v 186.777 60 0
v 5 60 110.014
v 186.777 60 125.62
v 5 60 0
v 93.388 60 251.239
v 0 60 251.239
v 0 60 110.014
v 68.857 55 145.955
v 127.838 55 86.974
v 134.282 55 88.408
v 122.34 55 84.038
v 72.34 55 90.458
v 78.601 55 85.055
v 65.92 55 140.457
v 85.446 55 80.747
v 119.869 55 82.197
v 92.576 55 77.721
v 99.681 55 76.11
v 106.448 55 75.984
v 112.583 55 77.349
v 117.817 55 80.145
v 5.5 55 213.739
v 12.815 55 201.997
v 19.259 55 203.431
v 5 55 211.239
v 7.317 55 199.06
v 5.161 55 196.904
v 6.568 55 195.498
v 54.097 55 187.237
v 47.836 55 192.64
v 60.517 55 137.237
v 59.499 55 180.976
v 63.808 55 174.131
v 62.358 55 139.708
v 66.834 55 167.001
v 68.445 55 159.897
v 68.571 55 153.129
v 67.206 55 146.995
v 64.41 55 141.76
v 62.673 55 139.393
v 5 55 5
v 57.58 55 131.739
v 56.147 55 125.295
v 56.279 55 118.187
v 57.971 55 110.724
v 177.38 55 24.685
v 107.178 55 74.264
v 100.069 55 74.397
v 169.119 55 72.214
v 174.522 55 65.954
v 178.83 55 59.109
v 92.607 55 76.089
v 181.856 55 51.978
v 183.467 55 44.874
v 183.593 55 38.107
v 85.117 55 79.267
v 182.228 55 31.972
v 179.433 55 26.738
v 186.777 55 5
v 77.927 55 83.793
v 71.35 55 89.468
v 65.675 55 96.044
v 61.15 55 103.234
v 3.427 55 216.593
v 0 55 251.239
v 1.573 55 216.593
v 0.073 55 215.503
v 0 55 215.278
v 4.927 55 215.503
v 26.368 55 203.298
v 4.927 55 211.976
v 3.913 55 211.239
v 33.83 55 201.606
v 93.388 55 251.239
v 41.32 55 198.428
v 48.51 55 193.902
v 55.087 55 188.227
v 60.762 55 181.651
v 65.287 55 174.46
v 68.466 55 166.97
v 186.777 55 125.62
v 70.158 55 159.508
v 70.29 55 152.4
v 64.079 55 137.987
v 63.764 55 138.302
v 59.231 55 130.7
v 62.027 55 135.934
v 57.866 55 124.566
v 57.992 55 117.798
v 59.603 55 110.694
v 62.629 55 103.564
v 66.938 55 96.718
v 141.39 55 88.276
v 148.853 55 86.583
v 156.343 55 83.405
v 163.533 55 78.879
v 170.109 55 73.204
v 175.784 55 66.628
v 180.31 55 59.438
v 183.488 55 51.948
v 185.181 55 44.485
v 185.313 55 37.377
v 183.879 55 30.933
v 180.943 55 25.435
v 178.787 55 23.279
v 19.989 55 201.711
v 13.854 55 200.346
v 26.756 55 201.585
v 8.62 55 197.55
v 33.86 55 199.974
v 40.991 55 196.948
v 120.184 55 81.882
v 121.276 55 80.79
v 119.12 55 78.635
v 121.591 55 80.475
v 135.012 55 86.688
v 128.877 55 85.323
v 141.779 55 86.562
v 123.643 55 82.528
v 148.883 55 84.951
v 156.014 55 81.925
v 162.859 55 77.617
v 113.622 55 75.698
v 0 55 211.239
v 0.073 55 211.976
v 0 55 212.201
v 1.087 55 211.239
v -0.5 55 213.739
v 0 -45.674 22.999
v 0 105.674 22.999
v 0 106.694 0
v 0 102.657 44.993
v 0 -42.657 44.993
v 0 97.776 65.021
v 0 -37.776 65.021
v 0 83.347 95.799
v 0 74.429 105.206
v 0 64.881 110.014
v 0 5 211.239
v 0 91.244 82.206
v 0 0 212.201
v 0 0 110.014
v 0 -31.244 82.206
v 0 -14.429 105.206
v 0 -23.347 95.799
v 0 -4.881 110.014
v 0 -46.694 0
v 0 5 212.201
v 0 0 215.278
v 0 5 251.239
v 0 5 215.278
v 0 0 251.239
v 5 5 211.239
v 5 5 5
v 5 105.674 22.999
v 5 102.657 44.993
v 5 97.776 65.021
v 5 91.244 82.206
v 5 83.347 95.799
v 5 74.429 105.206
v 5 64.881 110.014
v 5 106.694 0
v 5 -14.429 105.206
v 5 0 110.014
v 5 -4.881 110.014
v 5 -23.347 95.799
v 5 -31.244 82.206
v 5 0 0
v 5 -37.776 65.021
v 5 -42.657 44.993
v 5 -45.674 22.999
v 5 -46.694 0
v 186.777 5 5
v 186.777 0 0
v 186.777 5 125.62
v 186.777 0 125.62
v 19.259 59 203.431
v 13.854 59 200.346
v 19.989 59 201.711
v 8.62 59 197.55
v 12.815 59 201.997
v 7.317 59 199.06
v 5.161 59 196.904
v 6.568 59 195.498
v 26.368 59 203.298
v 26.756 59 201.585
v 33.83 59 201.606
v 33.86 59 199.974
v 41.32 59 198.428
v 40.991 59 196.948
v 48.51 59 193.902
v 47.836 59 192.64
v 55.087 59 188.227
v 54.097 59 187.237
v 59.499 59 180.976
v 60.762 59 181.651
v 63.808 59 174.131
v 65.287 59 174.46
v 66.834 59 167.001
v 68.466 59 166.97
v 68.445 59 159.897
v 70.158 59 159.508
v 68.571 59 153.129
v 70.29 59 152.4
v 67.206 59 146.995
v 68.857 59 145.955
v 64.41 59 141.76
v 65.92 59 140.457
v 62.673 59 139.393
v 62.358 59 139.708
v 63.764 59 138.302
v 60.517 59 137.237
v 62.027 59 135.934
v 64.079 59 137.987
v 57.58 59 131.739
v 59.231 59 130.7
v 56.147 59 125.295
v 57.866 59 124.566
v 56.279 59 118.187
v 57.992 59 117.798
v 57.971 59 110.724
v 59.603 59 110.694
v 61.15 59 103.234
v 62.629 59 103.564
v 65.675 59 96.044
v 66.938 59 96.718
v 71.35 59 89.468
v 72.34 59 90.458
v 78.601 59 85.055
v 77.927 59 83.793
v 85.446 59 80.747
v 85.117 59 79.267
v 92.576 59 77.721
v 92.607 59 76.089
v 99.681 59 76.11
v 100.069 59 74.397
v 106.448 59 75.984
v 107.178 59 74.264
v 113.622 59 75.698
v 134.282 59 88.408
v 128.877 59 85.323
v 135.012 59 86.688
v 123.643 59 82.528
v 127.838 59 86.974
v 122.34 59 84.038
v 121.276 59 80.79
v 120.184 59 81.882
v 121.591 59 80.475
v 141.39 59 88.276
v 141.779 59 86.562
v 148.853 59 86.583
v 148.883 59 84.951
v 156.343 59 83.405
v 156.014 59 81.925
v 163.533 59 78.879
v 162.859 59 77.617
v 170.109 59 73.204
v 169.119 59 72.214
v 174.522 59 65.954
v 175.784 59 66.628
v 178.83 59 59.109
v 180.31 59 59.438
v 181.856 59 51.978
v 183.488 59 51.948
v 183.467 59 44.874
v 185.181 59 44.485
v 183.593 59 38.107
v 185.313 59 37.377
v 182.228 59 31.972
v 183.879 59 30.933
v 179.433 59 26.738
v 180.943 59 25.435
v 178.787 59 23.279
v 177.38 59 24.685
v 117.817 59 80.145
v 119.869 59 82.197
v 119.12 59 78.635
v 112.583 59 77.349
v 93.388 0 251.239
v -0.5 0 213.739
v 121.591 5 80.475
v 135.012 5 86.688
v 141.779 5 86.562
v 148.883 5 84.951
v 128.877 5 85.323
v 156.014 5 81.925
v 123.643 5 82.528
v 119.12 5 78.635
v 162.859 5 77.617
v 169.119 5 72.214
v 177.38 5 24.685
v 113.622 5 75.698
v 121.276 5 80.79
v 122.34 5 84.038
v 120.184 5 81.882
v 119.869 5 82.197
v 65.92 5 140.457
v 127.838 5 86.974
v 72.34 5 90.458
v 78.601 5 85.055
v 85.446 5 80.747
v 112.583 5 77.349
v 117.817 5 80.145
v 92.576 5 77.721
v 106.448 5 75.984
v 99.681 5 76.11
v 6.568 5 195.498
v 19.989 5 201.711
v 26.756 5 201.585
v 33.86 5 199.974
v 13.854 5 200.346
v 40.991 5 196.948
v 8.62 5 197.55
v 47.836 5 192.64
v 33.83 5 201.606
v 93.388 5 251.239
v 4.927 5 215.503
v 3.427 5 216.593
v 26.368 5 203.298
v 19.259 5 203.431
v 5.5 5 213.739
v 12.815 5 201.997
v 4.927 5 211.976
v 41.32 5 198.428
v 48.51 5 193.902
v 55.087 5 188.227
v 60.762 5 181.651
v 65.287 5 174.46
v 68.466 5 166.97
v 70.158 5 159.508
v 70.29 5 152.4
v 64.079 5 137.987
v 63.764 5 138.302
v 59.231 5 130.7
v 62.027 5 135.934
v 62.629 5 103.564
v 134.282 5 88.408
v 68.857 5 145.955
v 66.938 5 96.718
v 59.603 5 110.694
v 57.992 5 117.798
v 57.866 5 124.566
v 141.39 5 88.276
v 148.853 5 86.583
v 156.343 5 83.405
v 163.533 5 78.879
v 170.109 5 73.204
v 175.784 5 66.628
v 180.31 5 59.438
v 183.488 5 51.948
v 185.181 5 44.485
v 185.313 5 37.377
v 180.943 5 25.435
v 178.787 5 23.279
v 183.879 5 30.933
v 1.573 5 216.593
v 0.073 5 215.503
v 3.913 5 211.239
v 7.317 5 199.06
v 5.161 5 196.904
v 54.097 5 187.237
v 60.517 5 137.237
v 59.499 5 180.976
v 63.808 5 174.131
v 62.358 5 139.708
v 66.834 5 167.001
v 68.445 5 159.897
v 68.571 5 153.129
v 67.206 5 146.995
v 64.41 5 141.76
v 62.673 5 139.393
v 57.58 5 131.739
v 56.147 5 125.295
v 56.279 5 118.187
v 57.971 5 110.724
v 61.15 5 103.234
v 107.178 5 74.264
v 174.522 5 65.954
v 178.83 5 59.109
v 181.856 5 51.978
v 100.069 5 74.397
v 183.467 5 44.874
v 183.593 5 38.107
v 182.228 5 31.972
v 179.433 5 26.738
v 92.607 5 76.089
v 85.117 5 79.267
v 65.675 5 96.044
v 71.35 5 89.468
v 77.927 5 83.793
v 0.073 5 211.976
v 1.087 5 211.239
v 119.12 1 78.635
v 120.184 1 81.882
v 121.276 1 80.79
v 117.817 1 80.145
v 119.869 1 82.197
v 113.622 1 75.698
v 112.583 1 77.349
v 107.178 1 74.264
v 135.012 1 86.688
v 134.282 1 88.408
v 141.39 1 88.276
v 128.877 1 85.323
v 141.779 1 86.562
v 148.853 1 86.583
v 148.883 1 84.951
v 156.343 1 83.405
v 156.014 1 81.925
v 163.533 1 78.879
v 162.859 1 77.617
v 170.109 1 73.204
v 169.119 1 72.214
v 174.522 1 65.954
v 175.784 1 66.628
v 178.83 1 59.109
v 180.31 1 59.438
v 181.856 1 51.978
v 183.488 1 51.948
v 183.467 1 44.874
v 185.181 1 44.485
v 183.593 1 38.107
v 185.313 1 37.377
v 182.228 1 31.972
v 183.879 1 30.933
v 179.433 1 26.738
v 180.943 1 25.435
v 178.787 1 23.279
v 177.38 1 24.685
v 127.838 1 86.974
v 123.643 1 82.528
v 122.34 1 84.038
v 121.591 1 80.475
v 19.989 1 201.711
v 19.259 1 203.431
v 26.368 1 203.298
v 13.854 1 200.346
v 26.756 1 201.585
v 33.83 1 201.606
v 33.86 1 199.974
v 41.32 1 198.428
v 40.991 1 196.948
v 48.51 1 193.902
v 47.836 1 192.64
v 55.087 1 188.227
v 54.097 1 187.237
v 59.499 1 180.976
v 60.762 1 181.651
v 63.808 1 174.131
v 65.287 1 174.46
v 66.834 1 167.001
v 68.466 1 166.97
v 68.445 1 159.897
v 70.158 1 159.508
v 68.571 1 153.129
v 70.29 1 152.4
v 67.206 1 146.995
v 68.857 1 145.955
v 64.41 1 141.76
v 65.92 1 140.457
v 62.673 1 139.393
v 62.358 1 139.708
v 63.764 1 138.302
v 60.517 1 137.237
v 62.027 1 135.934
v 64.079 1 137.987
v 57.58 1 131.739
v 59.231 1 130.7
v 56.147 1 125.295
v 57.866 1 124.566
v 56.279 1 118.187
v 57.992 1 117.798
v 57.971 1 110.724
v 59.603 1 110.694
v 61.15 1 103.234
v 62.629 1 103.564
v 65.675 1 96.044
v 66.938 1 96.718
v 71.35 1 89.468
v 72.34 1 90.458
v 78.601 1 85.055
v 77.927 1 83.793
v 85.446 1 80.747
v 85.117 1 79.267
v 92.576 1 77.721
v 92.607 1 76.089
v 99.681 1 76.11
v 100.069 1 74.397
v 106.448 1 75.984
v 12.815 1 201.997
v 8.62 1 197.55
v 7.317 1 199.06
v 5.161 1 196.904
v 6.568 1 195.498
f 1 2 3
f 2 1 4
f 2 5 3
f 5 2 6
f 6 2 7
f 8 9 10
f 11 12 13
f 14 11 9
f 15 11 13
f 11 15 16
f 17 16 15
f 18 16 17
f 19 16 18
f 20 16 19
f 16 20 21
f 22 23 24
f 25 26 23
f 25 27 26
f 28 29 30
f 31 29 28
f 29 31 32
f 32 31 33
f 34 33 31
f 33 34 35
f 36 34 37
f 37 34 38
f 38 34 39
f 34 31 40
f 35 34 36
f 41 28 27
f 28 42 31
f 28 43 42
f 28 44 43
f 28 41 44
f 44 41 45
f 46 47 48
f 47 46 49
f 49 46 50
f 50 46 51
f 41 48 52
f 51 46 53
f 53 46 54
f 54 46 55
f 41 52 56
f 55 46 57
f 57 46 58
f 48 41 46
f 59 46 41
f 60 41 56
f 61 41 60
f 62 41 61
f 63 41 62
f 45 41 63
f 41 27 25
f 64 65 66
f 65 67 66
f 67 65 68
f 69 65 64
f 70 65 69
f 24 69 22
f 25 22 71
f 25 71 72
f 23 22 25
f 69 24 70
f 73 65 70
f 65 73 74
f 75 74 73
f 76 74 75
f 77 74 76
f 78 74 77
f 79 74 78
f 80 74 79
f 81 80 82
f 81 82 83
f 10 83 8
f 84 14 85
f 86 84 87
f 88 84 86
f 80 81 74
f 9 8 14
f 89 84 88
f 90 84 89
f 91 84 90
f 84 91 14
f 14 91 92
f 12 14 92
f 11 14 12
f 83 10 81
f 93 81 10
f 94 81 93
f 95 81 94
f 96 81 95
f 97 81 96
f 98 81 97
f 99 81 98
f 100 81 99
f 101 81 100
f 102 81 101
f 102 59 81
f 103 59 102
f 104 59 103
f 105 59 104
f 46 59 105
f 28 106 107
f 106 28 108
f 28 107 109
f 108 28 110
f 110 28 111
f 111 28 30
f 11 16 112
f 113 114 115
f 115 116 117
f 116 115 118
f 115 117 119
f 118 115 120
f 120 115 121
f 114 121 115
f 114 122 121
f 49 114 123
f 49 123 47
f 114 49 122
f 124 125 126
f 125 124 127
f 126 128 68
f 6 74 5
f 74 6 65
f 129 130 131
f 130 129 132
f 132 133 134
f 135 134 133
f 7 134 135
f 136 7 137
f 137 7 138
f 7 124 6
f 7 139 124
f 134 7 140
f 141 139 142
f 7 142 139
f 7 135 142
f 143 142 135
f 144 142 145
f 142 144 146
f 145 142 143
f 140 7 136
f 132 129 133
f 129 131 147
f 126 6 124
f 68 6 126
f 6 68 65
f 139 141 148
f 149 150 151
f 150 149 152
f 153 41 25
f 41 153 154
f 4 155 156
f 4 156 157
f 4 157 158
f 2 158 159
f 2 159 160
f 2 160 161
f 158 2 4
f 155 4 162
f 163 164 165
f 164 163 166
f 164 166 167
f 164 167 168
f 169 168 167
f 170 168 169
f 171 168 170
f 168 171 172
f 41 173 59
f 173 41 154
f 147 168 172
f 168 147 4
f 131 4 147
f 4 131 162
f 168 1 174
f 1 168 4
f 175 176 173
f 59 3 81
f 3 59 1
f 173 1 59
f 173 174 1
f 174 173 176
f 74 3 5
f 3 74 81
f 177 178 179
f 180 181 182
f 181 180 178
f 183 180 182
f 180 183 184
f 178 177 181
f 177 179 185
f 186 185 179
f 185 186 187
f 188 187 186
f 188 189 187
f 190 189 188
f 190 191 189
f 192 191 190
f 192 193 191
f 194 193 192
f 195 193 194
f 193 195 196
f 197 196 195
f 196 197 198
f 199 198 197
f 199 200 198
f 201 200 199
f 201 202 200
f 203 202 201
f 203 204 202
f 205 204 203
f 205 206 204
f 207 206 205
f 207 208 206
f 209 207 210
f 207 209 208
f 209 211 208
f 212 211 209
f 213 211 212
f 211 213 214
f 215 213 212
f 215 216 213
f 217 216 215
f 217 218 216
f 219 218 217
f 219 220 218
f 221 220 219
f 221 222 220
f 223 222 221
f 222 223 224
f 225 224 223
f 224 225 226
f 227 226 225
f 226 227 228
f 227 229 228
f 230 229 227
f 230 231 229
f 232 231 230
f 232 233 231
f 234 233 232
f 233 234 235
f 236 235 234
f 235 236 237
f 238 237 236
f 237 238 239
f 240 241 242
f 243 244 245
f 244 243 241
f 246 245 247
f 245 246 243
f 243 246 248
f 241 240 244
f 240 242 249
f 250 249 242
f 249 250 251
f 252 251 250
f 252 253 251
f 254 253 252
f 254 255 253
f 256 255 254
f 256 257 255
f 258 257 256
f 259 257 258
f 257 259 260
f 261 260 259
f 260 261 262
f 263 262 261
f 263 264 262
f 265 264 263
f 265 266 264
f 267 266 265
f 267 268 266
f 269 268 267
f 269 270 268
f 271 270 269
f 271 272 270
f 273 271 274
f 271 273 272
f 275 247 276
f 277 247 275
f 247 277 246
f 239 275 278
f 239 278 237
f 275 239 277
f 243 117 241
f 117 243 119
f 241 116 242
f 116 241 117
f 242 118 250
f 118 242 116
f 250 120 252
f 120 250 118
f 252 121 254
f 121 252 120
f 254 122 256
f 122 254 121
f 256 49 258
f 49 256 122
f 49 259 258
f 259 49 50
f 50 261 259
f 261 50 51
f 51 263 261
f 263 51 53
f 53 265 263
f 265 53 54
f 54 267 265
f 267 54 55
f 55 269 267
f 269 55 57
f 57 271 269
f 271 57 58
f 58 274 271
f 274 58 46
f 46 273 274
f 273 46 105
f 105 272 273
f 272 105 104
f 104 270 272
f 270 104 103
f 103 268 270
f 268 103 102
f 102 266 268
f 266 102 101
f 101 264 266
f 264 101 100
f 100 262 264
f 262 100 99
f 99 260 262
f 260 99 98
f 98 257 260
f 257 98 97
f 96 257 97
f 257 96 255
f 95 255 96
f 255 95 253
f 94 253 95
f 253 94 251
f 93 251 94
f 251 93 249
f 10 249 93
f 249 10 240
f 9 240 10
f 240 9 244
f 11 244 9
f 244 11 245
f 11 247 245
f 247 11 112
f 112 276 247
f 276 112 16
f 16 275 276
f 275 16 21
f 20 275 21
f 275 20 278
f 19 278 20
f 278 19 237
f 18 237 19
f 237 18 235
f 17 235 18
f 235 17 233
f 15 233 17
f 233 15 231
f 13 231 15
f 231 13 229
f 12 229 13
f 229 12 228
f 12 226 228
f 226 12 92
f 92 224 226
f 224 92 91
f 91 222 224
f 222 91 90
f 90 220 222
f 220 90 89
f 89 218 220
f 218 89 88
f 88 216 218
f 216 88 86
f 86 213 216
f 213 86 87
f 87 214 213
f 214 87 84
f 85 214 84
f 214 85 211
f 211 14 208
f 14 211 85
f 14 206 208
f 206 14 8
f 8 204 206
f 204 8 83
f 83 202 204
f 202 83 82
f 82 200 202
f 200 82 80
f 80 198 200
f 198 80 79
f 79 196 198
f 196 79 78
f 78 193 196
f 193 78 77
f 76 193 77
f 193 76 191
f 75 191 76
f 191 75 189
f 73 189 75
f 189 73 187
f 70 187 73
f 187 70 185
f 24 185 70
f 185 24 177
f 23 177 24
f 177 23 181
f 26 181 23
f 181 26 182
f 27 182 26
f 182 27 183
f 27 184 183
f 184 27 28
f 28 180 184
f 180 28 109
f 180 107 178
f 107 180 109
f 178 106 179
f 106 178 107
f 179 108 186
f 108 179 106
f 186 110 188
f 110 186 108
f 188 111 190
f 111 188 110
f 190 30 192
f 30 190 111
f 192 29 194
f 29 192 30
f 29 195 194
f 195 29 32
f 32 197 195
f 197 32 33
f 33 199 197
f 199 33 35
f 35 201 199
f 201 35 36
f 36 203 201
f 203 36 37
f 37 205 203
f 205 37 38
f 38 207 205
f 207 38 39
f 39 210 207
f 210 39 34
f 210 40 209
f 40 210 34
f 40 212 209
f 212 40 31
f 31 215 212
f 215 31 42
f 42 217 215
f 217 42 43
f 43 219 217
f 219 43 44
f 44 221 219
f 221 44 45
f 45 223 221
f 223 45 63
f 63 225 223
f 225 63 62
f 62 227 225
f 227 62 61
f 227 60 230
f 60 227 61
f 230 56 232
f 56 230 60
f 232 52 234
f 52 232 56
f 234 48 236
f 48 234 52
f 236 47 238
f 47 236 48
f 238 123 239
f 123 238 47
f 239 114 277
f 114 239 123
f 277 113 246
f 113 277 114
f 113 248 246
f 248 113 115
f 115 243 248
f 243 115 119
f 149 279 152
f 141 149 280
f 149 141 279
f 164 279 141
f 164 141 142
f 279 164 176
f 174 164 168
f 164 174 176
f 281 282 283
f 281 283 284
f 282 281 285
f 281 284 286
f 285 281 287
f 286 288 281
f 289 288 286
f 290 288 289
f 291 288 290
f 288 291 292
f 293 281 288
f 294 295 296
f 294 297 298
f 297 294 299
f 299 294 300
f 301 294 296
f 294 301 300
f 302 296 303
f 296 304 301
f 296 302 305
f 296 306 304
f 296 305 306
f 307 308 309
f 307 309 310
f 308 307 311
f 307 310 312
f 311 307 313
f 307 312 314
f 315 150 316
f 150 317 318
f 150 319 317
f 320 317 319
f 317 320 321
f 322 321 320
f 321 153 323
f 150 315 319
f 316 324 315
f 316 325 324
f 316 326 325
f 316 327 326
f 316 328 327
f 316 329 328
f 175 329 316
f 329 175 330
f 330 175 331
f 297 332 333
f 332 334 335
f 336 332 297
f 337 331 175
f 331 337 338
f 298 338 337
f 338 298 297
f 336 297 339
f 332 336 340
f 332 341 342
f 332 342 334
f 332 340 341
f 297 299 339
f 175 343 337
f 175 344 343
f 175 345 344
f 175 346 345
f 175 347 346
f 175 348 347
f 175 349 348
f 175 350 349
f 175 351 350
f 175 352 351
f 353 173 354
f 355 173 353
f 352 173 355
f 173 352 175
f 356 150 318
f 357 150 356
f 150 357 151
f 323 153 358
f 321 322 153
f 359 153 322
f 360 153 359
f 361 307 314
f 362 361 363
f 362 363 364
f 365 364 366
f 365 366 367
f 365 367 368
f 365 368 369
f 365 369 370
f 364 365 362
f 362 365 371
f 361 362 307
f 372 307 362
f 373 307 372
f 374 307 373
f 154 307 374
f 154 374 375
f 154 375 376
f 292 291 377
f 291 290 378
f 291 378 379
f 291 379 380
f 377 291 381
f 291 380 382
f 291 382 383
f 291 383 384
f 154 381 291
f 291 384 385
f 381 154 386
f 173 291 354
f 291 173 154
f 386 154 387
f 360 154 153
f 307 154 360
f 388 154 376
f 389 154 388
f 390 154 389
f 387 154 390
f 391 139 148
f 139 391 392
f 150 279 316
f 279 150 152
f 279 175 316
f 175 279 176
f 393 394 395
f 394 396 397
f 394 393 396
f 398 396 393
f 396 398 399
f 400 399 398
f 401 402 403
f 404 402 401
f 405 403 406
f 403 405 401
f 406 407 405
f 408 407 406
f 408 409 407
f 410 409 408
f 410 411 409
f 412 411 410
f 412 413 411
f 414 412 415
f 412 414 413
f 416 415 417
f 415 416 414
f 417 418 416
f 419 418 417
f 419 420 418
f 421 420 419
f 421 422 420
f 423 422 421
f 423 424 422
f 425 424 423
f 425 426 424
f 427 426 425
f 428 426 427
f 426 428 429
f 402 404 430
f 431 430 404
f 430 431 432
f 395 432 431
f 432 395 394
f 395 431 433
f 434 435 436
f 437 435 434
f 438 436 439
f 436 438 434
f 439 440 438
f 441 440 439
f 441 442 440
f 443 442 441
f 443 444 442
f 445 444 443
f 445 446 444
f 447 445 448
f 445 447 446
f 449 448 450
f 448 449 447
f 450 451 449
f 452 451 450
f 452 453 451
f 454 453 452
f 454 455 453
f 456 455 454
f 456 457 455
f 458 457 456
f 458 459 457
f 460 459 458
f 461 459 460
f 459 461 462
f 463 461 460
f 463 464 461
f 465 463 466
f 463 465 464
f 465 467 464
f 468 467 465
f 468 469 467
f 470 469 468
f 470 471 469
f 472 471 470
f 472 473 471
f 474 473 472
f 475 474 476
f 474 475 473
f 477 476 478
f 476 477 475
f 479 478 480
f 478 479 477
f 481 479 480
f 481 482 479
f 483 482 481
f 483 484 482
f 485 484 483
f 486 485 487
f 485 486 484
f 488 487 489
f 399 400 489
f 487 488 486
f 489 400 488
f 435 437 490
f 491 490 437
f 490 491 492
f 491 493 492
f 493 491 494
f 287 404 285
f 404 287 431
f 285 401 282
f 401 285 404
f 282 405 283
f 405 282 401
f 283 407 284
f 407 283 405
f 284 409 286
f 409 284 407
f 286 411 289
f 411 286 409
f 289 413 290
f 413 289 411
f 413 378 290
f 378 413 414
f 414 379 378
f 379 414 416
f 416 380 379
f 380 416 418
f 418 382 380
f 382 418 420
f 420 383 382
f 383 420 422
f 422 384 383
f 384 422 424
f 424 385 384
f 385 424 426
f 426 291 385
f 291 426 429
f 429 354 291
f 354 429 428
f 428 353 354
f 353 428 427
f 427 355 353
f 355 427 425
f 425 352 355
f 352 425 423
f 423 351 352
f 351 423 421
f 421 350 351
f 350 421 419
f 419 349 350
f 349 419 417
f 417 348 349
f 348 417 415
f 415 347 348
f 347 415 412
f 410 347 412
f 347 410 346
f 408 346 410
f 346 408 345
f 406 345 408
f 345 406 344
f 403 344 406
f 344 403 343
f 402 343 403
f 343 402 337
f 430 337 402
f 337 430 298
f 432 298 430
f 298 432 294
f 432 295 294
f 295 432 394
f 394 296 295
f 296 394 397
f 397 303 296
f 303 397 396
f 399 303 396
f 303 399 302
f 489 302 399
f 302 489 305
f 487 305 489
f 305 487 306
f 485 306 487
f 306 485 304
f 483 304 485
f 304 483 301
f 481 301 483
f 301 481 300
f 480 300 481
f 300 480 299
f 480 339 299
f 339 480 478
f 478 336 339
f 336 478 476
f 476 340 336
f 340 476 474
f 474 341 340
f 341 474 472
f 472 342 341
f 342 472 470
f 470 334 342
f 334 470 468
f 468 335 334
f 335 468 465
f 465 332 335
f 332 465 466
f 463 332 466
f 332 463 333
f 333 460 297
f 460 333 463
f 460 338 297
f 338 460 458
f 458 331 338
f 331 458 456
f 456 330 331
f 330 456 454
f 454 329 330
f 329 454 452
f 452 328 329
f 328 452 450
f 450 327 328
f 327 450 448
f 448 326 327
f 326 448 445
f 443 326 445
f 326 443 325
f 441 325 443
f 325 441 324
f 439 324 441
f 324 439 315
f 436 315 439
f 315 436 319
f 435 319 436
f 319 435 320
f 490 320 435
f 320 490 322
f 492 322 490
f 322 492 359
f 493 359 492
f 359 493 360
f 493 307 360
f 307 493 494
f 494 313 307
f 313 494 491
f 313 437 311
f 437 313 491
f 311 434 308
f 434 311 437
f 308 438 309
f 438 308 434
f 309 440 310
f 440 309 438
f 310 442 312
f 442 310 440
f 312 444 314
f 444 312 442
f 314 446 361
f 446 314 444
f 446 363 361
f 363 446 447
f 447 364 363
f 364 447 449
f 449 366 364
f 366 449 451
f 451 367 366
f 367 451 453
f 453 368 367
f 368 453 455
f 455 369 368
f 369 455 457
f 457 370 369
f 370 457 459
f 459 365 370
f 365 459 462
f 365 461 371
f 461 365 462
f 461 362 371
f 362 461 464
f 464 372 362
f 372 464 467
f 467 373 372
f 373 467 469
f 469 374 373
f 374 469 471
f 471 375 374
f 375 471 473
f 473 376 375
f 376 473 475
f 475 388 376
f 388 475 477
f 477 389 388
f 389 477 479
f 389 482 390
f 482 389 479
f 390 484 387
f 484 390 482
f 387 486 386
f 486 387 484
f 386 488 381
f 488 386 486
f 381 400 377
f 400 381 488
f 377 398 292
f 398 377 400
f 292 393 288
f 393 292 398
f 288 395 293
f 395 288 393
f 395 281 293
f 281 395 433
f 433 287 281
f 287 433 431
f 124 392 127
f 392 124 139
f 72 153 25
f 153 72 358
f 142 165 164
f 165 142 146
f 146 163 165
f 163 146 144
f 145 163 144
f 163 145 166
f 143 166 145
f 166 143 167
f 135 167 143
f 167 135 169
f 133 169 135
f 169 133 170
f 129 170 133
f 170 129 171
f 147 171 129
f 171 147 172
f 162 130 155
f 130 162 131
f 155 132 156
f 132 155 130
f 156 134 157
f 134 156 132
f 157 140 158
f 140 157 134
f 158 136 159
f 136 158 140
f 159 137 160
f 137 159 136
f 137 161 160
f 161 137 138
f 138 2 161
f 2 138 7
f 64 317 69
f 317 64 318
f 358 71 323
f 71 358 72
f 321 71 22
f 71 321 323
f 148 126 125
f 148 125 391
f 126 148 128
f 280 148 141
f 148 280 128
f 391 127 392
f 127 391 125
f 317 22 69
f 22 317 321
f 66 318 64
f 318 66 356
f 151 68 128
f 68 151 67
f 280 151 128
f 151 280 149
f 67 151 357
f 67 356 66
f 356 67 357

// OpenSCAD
// file: solder2.5d.scad
//
//  Copyright (C) 05-11-2012 Jasper den Ouden.
//
//  This is free software: you can redistribute it and/or modify
//  it under the terms of the GNU General Public License as published
//  by the Free Software Foundation, either version 3 of the License, or
//  (at your option) any later version.
//

plate_w = 5;

internal_w = 50;

f = 0.5;
s_h = max(40,2*plate_w);

solder_l = 250; //space reserved for soldering iron length.
solder_a = 45;
w = internal_w + 2*plate_w;
h = plate_w + solder_l*(1+1/6)*sin(solder_a) + s_h;
l = 2*plate_w + solder_l*cos(solder_a);

sliver_r = solder_l/6;
sliver_d = 2;

cut_d = 4;
cut_r = 1;

extra_w = l/4; //TODO widen the base

module sliver()
{ scale([0.7,1]) difference()
    { circle(sliver_r);
      circle(sliver_r - sliver_d);
      translate([0,-sliver_r]) square([sliver_r, 2*sliver_r]);
    }
}

module side_cut()
{ translate([-sliver_r,-sliver_r]) linear_extrude(height=2*cut_d) union()
    { sliver();
      translate([0,2*sliver_r-sliver_d]) scale([-1,1]) sliver();
      translate([0,2*(2*sliver_r-sliver_d)]) sliver();
    }
}

module side()
{ difference()
    { linear_extrude(height=plate_w) difference()
        { square([l,h]);
          square([f*l,plate_w]);
          square([plate_w,f*h]);
          polygon([[l,h], [f*l,h], [l,f*h]]);
        }
        translate([plate_w + sliver_r*cos(solder_a),
                   h-solder_l/2-h*0.05-plate_w, plate_w-cut_d]) 
          rotate(a=180+solder_a) side_cut();
    }
}

module bottom()
{ linear_extrude(height=plate_w) difference()
  { square([l,w]);
    translate([(1-f)*l,0]) square([l, plate_w]);
    translate([(1-f)*l,w-plate_w]) square([l,plate_w]);
  }
}

module backcir()
{ r= f*(h-s_h+2*plate_w);
  scale([extra_w/r,1]) circle(r);
}

module back()
{ r = f*(h-s_h+2*plate_w);
  linear_extrude(height=plate_w) difference()
  { union()
      { square([w,h-plate_w - s_h]);
        translate([0,-plate_w]) backcir();
        translate([w,-plate_w]) backcir();
      }
    translate([-2*extra_w,-2*r-plate_w]) 
        square([2*(w+2*extra_w), 2*r]);
    translate([0,-2*plate_w]) square([w,2*plate_w]);
    
    translate([0,(1-f)*h-plate_w]) square([plate_w,h]);
    translate([w-plate_w,(1-f)*h-plate_w]) square([plate_w,h]);
//    translate([plate_w,h-plate_w])
//        polygon([[0,0], [w-2*plate_w,0], [(w-2*plate_w)/2,-w/2]]);
  }
}
//TODO now the cut and, the metal, and the bolts
// main file
//
//  Copyright (C) 05-11-2012 Jasper den Ouden.
//
//  This is free software: you can redistribute it and/or modify
//  it under the terms of the GNU General Public License as published
//  by the Free Software Foundation, either version 3 of the License, or
//  (at your option) any later version.
//

include<solder2.5d.scad>

module back3d()
{ color([1,0,0]) rotate(a=90, v=[0,0,1]) rotate(a=90,v=[1,0,0]) 
        back();
}

module whole()
{ translate([0,0,plate_w]) back3d();
  translate([0,w]) rotate(a=90, v=[1,0,0]) side();
  scale([1,-1]) rotate(a=90, v=[1,0,0]) side();
  color([0,0,1]) bottom();
  
  rotate(a=-90, v=[1,0,0]) union()
  { translate([plate_w/2,-h+s_h - plate_w/2]) cylinder(r=3,h=w-plate_w);
      // translate([w,-plate_w - plate_w]) cylinder(r=2,h=w-plate_w);
  }
}

whole();
